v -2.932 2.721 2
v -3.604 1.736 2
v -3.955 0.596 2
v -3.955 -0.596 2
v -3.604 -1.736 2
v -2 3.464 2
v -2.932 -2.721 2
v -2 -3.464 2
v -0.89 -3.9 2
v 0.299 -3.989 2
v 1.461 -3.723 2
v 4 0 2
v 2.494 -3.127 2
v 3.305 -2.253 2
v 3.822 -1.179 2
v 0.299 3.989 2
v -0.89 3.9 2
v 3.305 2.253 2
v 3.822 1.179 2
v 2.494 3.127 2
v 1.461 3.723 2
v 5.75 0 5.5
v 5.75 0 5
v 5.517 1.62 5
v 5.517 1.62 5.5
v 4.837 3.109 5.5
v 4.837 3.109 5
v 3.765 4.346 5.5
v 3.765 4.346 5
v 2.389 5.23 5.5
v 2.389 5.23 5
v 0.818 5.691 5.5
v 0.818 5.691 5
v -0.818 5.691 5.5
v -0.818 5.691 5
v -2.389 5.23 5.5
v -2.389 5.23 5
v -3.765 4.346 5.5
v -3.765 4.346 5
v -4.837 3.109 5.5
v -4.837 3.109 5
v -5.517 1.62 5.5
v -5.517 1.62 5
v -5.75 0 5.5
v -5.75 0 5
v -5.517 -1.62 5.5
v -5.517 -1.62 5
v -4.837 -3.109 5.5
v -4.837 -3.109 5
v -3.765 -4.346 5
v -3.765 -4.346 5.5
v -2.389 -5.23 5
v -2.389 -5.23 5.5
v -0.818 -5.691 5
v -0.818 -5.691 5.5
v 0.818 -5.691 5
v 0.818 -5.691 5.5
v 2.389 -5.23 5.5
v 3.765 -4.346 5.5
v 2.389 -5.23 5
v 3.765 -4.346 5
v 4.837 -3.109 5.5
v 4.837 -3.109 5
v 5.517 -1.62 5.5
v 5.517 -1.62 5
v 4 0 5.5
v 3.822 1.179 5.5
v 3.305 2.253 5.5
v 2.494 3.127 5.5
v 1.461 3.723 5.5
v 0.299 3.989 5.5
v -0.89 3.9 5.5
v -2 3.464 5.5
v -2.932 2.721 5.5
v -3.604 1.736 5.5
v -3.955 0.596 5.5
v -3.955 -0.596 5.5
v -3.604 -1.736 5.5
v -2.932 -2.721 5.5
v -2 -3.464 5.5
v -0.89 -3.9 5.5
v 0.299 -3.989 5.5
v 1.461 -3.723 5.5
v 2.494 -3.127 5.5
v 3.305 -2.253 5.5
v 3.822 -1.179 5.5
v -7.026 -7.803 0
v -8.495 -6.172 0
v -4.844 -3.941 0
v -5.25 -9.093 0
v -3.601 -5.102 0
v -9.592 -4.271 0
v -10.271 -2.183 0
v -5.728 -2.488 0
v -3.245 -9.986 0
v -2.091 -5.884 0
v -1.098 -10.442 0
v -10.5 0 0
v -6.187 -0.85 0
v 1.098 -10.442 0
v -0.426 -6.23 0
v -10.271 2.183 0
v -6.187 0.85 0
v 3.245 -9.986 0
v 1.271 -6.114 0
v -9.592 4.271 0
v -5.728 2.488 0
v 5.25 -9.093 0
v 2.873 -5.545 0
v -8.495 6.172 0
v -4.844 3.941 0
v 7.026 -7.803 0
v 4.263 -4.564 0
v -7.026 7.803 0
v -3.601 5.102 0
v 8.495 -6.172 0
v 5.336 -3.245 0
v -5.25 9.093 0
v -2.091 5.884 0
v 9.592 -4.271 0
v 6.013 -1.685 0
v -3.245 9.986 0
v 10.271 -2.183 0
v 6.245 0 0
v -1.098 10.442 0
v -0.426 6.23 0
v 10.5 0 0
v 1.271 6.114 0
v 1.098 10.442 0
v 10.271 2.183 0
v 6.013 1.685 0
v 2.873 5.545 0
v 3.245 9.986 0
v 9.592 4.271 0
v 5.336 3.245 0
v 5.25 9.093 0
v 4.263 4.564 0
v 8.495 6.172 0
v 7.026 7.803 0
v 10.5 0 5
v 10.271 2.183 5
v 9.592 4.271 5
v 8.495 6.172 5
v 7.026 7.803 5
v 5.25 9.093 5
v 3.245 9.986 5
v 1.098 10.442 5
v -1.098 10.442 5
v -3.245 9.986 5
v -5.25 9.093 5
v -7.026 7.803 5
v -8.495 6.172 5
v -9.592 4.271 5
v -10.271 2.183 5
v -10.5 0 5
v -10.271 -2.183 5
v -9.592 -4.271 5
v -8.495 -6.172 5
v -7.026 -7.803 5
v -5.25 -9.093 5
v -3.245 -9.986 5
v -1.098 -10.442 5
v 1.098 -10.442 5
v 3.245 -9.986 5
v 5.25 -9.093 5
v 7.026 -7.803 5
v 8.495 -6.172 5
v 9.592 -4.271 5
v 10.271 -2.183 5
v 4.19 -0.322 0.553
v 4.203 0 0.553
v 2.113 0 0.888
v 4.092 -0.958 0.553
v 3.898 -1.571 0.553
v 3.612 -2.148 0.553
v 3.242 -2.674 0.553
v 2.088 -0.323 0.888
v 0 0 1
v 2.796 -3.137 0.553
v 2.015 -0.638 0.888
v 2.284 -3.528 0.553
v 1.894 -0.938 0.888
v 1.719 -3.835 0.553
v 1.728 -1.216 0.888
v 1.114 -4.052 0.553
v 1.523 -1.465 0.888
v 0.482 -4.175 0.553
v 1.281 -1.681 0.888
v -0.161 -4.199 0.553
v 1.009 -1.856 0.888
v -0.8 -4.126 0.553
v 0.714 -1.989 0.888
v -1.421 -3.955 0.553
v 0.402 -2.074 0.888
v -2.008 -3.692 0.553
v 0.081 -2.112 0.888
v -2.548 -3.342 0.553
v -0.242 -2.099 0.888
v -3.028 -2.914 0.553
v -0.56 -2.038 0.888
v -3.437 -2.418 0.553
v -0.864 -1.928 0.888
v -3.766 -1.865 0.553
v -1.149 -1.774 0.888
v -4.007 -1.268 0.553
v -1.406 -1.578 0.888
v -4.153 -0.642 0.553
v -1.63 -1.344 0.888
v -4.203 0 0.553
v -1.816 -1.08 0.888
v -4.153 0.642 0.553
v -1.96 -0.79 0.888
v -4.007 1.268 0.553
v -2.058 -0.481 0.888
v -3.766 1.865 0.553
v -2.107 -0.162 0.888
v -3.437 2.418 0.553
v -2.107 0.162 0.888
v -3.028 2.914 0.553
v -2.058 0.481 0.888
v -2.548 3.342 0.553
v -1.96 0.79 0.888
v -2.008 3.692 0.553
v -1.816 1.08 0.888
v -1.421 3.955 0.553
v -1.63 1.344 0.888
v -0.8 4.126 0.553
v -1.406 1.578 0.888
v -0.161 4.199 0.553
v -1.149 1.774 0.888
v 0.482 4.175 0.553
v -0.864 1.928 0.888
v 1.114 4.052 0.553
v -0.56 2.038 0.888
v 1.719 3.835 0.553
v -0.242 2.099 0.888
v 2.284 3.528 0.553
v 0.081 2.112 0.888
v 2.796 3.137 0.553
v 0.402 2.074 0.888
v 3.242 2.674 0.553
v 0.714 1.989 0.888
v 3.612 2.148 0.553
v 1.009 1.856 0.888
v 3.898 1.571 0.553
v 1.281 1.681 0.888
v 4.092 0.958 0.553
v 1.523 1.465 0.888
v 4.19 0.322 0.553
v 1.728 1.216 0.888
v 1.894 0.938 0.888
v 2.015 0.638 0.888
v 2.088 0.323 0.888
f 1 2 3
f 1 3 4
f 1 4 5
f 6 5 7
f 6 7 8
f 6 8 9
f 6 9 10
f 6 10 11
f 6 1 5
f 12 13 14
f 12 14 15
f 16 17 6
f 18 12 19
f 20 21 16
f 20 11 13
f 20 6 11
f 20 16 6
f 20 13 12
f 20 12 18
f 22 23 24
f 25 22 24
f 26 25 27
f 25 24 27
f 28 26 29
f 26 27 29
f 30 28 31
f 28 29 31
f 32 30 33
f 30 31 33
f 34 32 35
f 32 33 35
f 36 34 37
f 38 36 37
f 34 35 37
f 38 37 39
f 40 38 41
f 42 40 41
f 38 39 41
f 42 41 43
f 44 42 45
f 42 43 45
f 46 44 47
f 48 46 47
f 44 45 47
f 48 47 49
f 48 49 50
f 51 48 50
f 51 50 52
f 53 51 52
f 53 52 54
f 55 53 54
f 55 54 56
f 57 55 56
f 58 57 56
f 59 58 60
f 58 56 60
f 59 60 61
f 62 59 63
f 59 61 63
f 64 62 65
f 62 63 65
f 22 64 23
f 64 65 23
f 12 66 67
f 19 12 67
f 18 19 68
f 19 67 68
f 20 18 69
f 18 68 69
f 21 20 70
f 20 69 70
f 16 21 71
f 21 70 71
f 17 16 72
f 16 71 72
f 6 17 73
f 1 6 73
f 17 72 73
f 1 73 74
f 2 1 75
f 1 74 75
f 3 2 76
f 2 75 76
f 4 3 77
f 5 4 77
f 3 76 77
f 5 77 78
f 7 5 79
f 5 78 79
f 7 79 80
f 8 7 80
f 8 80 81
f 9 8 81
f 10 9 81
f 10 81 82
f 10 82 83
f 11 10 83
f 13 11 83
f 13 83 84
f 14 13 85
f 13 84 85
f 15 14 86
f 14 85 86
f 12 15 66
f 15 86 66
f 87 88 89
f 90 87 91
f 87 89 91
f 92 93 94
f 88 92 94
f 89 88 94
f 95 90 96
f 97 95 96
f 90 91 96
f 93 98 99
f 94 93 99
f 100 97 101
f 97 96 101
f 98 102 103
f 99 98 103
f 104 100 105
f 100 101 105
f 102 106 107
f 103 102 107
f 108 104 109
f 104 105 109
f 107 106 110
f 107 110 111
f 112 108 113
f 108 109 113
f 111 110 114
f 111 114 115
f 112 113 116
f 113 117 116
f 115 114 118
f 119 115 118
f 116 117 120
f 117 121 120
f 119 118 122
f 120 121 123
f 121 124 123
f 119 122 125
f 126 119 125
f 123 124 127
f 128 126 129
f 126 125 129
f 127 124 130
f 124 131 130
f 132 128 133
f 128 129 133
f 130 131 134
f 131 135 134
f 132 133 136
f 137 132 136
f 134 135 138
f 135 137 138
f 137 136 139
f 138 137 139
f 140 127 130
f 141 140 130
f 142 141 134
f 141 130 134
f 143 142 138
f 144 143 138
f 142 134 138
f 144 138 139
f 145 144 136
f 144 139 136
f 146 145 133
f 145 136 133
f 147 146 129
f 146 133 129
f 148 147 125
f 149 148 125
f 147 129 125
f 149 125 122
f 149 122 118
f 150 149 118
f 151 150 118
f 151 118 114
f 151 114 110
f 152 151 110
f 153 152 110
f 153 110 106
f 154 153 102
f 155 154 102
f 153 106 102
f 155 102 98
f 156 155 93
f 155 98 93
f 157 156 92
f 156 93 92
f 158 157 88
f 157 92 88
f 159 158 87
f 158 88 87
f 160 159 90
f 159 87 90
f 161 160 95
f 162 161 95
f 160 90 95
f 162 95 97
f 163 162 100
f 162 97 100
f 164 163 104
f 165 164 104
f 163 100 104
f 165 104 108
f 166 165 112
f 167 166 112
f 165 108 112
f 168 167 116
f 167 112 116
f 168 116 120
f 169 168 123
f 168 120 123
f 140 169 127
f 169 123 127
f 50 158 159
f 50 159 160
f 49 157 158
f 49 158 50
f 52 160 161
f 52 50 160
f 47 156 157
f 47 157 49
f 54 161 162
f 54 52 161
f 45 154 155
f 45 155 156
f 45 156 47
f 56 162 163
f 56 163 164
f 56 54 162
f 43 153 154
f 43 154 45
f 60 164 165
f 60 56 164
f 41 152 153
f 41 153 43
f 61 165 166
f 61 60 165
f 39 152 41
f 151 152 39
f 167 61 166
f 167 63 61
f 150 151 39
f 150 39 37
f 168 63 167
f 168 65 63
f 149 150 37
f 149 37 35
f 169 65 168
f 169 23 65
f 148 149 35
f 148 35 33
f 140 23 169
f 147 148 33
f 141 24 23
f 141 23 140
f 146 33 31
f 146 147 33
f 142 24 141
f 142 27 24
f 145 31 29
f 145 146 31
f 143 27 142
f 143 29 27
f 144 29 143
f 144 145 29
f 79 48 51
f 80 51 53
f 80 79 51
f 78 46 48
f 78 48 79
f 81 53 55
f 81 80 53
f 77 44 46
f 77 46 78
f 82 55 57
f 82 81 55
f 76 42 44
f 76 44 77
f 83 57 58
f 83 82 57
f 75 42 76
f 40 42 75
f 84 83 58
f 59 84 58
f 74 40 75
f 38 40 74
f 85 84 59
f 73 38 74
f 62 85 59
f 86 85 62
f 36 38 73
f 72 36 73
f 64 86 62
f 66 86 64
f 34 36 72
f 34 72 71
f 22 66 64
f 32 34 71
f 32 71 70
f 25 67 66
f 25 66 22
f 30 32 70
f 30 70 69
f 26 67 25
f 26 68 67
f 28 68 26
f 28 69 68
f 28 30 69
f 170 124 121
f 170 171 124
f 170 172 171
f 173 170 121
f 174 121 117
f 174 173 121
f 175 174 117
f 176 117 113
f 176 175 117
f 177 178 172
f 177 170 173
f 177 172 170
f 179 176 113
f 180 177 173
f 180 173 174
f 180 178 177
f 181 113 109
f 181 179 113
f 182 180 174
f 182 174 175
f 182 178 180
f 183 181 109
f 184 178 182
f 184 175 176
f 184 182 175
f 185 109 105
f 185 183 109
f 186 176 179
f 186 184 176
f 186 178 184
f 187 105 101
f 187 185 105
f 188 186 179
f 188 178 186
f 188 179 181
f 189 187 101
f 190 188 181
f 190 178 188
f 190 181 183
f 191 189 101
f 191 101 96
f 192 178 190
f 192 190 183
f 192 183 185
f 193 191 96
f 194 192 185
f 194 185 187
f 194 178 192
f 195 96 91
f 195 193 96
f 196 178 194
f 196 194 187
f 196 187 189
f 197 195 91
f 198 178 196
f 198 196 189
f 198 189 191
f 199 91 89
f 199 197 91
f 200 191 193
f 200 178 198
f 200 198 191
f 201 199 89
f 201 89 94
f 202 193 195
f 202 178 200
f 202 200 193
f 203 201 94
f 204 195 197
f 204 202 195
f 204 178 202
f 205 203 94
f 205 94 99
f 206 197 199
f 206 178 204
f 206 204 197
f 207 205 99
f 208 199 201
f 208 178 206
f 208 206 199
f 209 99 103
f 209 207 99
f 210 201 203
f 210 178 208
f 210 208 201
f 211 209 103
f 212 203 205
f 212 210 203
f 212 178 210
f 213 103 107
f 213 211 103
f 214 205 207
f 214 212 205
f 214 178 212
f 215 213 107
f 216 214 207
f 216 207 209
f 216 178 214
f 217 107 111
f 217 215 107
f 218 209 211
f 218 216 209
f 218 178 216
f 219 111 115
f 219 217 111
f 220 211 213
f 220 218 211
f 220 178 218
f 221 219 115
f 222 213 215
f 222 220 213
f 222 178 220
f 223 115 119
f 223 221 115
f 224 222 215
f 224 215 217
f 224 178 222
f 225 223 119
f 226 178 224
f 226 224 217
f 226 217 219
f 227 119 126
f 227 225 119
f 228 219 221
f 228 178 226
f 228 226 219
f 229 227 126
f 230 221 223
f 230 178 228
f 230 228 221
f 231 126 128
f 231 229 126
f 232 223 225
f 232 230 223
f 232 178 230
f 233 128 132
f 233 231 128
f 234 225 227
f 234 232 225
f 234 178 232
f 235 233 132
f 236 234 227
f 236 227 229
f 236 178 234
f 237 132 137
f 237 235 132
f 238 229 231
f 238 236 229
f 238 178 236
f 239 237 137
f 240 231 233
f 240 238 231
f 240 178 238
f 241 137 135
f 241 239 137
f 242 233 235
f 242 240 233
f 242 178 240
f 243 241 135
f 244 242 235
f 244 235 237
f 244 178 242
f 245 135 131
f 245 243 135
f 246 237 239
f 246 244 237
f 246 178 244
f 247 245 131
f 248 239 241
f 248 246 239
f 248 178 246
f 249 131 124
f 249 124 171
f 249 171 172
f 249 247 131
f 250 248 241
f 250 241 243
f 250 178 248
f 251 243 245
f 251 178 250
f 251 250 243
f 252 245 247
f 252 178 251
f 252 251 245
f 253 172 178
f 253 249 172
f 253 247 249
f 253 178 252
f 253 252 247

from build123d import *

# Parameters (mm, degrees)
F0_R     = 10.5
F1_DEPTH = 5
F2_R     = 5.75
F3_DEPTH = 0.5
F4_R     = 4
F5_DEPTH = 3.5


with BuildPart() as f1:
    # F0 (on Top) → F1 (new body)
    with BuildSketch(Plane.XY):
        Circle(F0_R)
    extrude(amount=F1_DEPTH)

    # F2 (on face) → F3 (join)
    with BuildSketch(Plane.XY.offset(5)):
        Circle(F2_R)
    extrude(amount=F3_DEPTH)

    # F4 (on face) → F5 (cut)
    with BuildSketch(Plane.XY.offset(5.5)):
        Circle(F4_R)
    extrude(amount=-F5_DEPTH, mode=Mode.SUBTRACT)

    # F6 (on Front) → F7 (revolve, cut)
    with BuildSketch(Plane.XZ):
        with BuildLine():
            Line((0, 1), (0, -39))
            ThreePointArc((0, -39), (20, -19), (0, 1))
        make_face()
    revolve(axis=Axis((0, 0, -19), (0, 0, -1)), mode=Mode.SUBTRACT)


solid = f1.part
